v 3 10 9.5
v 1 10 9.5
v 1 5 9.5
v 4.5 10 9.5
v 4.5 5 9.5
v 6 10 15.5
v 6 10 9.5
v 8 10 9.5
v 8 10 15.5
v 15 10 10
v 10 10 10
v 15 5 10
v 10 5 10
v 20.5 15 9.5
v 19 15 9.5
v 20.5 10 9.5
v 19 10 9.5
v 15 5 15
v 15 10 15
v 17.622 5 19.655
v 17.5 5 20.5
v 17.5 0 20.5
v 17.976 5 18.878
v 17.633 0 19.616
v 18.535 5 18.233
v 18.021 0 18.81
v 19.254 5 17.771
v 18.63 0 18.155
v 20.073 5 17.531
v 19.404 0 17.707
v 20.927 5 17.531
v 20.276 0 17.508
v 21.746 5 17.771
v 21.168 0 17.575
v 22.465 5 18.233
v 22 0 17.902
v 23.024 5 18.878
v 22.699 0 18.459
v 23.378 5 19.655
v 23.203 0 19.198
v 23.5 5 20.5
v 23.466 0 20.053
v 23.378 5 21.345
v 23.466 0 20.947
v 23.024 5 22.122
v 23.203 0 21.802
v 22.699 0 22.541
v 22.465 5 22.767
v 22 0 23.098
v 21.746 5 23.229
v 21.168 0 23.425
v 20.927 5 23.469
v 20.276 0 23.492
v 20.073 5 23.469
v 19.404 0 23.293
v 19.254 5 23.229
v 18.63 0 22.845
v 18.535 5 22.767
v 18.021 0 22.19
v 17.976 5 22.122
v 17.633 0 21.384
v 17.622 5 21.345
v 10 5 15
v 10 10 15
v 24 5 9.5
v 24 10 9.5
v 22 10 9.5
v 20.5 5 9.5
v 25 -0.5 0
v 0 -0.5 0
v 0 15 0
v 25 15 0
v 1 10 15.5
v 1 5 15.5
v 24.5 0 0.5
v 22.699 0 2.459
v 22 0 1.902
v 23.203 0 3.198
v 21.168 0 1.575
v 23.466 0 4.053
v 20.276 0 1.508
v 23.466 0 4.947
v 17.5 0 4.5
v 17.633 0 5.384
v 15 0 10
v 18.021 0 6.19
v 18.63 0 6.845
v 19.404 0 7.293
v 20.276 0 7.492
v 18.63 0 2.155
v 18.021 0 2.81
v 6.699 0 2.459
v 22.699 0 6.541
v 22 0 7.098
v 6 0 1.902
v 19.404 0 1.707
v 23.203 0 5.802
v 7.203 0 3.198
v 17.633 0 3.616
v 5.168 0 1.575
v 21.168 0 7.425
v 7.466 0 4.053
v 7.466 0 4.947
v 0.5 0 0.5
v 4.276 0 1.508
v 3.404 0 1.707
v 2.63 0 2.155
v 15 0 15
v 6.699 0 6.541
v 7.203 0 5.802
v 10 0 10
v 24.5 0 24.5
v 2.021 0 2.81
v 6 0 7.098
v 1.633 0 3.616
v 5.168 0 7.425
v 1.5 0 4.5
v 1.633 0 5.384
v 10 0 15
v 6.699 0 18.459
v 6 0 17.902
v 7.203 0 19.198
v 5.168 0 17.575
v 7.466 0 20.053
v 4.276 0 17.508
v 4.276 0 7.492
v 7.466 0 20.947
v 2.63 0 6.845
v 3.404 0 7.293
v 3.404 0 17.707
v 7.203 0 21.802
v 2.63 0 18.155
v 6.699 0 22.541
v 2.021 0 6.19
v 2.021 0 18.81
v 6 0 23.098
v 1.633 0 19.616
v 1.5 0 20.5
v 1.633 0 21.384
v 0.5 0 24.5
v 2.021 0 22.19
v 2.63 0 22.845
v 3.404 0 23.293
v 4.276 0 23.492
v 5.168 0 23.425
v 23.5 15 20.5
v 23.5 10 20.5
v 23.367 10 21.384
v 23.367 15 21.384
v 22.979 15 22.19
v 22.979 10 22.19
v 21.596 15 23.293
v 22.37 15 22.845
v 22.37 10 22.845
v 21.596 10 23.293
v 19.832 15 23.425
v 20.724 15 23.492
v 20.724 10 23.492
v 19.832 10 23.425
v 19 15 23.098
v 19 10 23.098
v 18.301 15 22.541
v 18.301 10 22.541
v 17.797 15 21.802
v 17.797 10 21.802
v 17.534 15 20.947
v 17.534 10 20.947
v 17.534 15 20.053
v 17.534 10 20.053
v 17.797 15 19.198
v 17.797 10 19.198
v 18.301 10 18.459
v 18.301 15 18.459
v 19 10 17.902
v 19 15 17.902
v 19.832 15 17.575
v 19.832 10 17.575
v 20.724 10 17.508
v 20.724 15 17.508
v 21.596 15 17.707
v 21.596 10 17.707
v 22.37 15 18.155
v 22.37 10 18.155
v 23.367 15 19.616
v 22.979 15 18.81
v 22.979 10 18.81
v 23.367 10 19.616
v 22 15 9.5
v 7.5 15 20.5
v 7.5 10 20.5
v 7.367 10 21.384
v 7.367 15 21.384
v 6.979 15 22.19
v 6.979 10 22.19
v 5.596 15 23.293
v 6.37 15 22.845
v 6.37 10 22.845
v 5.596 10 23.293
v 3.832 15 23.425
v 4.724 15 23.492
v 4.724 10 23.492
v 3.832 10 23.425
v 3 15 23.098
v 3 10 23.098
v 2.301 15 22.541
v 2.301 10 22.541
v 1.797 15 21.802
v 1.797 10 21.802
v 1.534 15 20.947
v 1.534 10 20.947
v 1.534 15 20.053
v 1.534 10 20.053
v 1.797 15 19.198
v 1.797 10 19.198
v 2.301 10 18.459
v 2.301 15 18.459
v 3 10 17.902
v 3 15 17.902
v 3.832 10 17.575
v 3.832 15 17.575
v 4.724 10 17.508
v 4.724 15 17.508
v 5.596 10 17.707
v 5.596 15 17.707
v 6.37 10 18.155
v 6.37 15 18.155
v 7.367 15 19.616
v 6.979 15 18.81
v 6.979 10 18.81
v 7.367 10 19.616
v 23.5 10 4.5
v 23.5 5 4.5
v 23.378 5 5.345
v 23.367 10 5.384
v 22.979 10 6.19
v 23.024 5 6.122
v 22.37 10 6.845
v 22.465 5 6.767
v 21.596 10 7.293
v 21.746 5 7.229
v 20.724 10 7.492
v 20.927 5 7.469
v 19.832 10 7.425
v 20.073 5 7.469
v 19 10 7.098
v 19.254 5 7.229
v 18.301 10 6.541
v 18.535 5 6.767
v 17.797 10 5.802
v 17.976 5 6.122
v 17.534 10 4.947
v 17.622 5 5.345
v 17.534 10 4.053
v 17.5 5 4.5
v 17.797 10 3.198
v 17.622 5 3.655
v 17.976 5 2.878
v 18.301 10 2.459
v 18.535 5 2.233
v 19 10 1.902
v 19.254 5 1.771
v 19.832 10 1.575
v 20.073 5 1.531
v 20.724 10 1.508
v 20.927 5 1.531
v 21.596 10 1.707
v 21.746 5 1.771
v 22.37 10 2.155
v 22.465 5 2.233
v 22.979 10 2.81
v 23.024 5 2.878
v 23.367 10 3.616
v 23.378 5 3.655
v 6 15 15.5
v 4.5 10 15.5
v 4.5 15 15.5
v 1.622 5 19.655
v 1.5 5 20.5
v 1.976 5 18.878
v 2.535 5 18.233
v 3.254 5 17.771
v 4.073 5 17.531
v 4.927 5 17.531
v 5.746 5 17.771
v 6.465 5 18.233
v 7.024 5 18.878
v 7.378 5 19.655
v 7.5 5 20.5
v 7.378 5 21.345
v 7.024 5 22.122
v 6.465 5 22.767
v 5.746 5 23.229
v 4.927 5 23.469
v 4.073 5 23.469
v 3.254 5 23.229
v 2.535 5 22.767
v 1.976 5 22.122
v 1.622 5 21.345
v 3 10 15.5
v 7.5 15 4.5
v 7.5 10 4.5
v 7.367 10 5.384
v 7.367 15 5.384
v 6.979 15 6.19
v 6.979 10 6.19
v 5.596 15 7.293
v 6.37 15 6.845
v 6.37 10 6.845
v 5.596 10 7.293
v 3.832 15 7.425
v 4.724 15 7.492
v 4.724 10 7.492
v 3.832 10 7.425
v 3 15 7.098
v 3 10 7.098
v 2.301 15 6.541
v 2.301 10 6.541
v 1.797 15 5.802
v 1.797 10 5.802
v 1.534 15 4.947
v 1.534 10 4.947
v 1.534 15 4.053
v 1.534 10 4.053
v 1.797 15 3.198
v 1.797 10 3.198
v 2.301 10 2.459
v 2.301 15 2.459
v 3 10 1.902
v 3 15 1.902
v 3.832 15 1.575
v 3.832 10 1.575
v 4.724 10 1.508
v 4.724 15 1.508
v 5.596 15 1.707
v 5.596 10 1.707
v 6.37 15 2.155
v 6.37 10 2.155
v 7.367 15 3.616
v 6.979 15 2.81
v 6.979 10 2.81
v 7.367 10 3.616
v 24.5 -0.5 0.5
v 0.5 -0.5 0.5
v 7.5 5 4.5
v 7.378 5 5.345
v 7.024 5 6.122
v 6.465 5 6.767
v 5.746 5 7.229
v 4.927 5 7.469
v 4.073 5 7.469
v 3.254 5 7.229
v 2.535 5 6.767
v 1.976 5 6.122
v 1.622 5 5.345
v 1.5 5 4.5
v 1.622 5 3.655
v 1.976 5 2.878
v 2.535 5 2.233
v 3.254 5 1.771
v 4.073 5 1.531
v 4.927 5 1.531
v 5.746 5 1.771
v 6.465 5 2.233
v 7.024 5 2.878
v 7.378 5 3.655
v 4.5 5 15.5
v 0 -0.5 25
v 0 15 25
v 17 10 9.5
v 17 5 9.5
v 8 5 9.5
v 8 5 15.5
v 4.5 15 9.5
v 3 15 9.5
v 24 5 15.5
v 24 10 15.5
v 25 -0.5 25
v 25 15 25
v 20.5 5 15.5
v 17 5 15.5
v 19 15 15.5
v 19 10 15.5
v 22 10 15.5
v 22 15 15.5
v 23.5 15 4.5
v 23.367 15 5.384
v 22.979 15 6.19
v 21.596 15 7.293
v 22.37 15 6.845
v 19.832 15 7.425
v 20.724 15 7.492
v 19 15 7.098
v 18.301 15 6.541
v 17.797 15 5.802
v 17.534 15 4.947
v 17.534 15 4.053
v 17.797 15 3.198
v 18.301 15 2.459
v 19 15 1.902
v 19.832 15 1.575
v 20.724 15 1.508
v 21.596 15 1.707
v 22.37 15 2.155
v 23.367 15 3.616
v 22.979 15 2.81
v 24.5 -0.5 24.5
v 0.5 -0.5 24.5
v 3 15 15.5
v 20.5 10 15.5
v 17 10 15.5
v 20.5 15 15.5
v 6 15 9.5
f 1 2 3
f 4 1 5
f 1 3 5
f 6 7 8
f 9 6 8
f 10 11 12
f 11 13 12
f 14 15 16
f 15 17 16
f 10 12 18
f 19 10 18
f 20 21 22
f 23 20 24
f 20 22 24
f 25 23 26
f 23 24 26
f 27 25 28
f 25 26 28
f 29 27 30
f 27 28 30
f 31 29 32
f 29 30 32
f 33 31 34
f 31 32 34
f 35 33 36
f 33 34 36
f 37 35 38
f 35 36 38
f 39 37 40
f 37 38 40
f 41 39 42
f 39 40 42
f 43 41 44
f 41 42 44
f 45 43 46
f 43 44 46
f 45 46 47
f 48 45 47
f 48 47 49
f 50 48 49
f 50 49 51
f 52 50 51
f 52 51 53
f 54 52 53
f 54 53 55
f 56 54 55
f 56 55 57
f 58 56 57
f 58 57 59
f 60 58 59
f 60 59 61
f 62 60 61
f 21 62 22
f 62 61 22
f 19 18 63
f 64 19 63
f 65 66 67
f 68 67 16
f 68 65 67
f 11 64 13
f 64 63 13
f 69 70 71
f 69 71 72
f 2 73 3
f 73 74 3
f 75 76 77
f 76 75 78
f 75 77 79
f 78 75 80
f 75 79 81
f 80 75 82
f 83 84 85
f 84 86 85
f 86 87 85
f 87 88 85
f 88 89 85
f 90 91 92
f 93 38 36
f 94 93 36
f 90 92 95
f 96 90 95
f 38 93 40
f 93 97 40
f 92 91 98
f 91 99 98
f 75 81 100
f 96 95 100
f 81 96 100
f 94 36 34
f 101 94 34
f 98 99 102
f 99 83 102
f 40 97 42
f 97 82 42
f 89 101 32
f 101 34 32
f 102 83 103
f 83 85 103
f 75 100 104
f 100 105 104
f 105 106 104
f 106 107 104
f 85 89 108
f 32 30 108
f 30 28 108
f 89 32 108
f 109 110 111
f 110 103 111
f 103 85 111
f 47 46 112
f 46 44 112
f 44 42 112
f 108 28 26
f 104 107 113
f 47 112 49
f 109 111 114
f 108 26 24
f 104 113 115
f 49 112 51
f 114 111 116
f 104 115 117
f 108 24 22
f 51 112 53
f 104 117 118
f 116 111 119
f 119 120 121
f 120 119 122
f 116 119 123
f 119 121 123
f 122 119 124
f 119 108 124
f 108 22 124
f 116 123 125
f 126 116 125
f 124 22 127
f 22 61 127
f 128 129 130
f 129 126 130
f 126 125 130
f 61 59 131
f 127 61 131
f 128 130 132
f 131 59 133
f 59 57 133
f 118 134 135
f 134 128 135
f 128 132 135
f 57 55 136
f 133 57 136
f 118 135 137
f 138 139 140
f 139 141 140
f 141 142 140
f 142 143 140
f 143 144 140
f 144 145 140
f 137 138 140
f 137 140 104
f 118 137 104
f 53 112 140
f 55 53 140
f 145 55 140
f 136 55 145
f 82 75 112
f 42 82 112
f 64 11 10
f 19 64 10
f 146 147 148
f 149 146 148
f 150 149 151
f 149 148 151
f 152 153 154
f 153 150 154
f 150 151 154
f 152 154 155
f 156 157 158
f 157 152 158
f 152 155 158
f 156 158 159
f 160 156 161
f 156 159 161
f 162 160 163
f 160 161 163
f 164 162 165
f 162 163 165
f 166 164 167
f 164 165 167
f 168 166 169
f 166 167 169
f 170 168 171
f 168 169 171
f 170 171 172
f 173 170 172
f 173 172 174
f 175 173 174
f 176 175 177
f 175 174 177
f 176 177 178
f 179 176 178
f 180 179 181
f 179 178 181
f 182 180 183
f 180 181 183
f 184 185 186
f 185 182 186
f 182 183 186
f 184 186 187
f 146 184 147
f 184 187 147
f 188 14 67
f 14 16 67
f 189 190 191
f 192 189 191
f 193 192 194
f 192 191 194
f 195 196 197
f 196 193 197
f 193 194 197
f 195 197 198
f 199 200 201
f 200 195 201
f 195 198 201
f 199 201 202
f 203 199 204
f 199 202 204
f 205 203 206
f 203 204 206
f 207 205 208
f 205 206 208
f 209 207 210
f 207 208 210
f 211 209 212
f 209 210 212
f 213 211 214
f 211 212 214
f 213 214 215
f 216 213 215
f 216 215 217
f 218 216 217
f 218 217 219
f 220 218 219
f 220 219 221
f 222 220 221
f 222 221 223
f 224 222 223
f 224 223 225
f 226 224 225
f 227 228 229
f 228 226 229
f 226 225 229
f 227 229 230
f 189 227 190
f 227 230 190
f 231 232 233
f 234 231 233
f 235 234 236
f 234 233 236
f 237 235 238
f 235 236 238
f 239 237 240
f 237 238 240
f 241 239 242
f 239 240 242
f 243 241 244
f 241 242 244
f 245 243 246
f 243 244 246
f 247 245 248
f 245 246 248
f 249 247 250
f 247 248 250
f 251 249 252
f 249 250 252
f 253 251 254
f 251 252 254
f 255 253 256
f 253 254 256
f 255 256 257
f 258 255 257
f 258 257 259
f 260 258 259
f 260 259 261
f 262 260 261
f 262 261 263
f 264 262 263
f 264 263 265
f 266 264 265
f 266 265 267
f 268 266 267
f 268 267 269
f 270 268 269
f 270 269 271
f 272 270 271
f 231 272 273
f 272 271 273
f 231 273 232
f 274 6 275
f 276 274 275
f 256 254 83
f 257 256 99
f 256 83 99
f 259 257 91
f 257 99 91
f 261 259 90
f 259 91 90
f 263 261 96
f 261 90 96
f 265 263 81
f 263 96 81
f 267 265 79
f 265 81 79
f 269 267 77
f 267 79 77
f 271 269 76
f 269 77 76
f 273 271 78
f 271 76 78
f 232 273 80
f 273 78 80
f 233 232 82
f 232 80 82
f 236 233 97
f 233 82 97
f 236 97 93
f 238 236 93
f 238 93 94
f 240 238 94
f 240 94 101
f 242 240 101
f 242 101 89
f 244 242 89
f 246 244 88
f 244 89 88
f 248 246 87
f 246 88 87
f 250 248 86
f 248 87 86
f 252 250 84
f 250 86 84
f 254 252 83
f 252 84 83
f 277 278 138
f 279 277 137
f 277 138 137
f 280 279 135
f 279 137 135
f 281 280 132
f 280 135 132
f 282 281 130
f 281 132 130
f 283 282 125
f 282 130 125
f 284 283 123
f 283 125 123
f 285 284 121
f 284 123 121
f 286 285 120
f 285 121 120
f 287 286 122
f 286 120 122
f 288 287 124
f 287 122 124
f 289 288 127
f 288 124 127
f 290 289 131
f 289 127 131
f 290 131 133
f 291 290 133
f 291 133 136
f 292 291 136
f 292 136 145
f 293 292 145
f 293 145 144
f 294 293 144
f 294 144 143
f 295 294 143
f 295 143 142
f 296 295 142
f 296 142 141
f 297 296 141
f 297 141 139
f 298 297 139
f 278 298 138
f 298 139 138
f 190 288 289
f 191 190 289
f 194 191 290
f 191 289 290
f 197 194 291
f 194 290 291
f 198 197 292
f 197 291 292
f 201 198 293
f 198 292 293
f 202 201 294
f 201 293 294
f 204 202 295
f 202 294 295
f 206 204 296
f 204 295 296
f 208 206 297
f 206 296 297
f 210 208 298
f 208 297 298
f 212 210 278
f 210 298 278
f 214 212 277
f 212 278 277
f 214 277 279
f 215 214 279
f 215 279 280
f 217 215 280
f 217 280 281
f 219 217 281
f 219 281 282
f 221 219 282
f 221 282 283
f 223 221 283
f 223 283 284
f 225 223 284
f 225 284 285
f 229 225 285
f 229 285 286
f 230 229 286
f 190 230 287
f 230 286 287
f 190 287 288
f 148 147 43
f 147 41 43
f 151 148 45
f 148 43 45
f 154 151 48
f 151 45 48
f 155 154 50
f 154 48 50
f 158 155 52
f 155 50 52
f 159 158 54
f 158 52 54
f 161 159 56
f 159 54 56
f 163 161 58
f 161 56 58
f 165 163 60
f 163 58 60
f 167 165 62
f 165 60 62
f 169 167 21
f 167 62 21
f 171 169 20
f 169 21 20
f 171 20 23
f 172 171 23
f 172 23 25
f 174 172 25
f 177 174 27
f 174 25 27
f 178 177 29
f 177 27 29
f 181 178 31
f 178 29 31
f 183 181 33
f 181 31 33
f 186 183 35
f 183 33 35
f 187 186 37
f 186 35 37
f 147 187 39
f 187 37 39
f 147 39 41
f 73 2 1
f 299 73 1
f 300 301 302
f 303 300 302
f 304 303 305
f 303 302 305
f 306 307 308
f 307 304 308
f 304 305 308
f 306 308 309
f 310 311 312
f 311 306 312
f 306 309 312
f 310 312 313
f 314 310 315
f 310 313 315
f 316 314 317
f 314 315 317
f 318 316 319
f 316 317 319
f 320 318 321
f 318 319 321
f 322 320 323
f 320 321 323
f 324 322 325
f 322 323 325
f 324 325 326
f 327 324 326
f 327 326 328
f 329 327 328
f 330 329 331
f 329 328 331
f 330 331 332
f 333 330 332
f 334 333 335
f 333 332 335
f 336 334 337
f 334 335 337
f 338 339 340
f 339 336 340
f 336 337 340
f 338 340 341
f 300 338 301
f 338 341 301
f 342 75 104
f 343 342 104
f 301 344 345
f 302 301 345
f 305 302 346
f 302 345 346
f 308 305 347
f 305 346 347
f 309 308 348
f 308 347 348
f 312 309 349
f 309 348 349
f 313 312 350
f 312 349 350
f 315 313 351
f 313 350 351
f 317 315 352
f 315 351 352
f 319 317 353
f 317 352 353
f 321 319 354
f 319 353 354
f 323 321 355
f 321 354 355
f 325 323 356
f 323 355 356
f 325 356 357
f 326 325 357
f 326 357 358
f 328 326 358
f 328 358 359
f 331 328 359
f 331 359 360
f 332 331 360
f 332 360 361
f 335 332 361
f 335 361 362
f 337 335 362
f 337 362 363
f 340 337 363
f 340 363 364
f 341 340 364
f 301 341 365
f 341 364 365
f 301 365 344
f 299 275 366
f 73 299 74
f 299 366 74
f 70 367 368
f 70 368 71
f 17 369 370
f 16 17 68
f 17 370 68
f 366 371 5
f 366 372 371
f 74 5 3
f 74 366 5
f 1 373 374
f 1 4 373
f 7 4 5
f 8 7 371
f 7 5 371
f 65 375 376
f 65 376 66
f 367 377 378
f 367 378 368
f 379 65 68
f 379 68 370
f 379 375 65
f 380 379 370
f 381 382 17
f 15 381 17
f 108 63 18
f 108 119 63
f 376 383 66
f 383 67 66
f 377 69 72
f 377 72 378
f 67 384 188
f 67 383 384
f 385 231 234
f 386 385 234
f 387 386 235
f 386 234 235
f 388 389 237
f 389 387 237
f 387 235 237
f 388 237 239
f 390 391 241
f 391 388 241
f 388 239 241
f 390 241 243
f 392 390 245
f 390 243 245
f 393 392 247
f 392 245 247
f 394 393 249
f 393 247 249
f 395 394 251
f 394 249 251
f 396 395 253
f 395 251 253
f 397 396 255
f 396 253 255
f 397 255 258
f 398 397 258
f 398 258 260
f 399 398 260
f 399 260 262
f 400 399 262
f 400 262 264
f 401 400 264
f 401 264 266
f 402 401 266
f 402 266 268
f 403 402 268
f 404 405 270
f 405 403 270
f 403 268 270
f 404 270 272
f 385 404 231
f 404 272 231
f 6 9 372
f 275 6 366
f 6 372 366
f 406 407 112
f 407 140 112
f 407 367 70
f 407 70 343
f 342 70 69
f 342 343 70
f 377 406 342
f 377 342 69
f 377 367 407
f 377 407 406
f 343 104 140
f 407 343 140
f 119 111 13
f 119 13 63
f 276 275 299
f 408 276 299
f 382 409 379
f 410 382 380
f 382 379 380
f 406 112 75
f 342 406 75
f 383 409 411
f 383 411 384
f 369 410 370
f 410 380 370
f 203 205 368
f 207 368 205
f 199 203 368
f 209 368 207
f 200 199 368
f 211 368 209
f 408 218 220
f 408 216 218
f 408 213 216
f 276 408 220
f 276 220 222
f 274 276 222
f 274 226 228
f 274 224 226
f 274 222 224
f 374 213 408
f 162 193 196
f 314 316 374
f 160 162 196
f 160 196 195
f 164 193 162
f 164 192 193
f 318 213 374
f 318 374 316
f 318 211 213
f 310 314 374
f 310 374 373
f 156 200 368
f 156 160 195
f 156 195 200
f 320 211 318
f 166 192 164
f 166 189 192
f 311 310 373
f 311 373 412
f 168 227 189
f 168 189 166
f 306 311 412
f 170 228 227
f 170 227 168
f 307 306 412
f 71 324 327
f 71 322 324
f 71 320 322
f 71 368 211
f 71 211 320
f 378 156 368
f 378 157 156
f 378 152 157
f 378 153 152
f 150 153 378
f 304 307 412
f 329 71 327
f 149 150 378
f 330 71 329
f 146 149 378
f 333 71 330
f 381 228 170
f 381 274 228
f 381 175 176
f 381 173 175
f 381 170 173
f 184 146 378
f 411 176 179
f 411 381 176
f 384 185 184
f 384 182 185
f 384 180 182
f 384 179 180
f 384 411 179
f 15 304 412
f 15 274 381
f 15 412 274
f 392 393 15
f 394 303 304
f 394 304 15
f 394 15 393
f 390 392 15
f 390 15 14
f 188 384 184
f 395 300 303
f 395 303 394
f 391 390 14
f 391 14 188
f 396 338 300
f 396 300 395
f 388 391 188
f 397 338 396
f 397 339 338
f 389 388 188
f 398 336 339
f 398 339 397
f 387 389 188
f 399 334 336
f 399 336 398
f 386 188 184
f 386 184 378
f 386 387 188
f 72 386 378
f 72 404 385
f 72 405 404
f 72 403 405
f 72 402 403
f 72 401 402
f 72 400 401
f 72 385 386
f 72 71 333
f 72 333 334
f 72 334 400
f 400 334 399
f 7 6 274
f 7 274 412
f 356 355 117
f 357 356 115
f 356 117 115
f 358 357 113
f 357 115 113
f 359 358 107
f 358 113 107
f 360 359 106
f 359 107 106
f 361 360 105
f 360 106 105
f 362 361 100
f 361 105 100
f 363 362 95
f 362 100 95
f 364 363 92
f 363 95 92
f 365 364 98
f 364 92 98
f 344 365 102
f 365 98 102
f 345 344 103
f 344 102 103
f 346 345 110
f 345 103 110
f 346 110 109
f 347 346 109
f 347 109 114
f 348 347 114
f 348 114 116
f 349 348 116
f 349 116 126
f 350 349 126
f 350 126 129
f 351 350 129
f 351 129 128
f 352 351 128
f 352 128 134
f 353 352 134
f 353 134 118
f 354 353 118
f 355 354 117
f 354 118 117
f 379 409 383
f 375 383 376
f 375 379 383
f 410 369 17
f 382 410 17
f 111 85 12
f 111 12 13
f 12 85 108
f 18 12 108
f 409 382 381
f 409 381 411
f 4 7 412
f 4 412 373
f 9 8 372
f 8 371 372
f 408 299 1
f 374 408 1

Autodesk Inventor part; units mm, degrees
ref_plane "YZ Plane" through (0, 0, 0) normal (1, 0, 0) x (0, 1, 0)
ref_plane "XZ Plane" through (0, 0, 0) normal (0, 1, 0) x (-1, 0, 0)
ref_plane "XY Plane" through (0, 0, 0) normal (0, 0, 1) x (1, 0, 0)
sketch "Sketch1" plane through (0, 0, 0) normal (0, 1, 0) x (-1, 0, 0)
  line L0 (0, 0) -> (-25, 0)
  line L1 (-25, 0) -> (-25, 25)
  line L2 (-25, 25) -> (0, 25)
  line L3 (0, 25) -> (0, 0)
  line L4 (-10, 12.5) -> (-10, 15)
  line L5 (-10, 15) -> (-12.5, 15)
  line L6 (-10, 12.5) -> (-10, 10)
  line L7 (-10, 10) -> (-12.5, 10)
  line L8 (-15, 12.5) -> (-15, 15)
  line L9 (-15, 15) -> (-12.5, 15)
  line L10 (-15, 12.5) -> (-15, 10)
  line L11 (-15, 10) -> (-12.5, 10)
  circle A0 centre (-4.5, 4.5) radius 3
  circle A1 centre (-20.5, 20.5) radius 3
  circle A2 centre (-4.5, 20.5) radius 3
  circle A3 centre (-20.5, 4.5) radius 3
  dimension "d0" = 25
  dimension "d1" = 25
  dimension "d2" = 2.5
  dimension "d3" = 2.5
  dimension "d4" = 2.5
  dimension "d5" = 2.5
  dimension "d6" = 2.5
  dimension "d8" = 6
  dimension "d9" = 6
  dimension "d10" = 6
  dimension "d11" = 6
extrude "Extrusion1" add sketch "Sketch1" along normal blind 5
sketch "Sketch4" plane through (0, 0, 0) normal (0, -1, 0) x (1, 0, 0)
  line L0 (0, 0) -> (0, 25) projected
  line L1 (25, 25) -> (25, 0) projected
  line L2 (0, 25) -> (25, 25)
  line L3 (25, 25) -> (25, 0)
  line L4 (25, 0) -> (0, 0)
  line L5 (0, 0) -> (0, 25)
  line L6 (0.5, 24.5) -> (24.5, 24.5)
  line L7 (24.5, 24.5) -> (24.5, 0.5)
  line L8 (24.5, 0.5) -> (0.5, 0.5)
  line L9 (0.5, 0.5) -> (0.5, 24.5)
  dimension "d18" = 24
  dimension "d19" = 24
extrude "Extrusion3" add sketch "Sketch4" along normal blind 0.5
sketch "Sketch5" plane through (0, 5, 0) normal (0, 1, 0) x (1, 0, 0)
  line L0 (20.5, -15.5) -> (17, -15.5)
  line L1 (17, -15.5) -> (17, -9.5)
  line L2 (17, -9.5) -> (20.5, -9.5)
  line L3 (20.5, -15.5) -> (24, -15.5)
  line L4 (24, -15.5) -> (24, -9.5)
  line L5 (24, -9.5) -> (20.5, -9.5)
  line L6 (8, -15.5) -> (4.5, -15.5)
  line L7 (4.5, -9.5) -> (8, -9.5)
  line L8 (8, -9.5) -> (8, -15.5)
  line L9 (4.5, -15.5) -> (1, -15.5)
  line L10 (1, -15.5) -> (1, -9.5)
  line L11 (1, -9.5) -> (4.5, -9.5)
  circle A0 centre (20.5, -20.5) radius 3
  circle A1 centre (4.5, -20.5) radius 3
  circle A2 centre (20.5, -4.5) radius 3
  circle A3 centre (4.5, -4.5) radius 3
  line L12 (15, -15) -> (10, -15) projected
  line L13 (10, -10) -> (15, -10) projected
  line L14 (15, -15) -> (10, -15)
  line L15 (10, -15) -> (10, -10)
  line L16 (10, -10) -> (15, -10)
  line L17 (15, -10) -> (15, -15)
  line L18 (25, -25) -> (0, -25) projected
  line L19 (25, -25) -> (0, -25)
  line L20 (0, -25) -> (0, 0)
  line L21 (0, 0) -> (25, 0)
  line L22 (25, 0) -> (25, -25)
  dimension "d22" = 3.5
  dimension "d23" = 6
  dimension "d24" = 3.5
  dimension "d25" = 3.5
  dimension "d26" = 6
  dimension "d27" = 3.5
  dimension "d28" = 6
  dimension "d29" = 6
  dimension "d30" = 6
  dimension "d31" = 6
extrude "Extrusion4" add sketch "Sketch5" along normal blind 5
sketch "Sketch6" plane through (0, 10, 0) normal (0, 1, 0) x (1, 0, 0)
  line L0 (17, -15.5) -> (24, -15.5) projected
  line L1 (17, -9.5) -> (24, -9.5) projected
  line L2 (20.5, -15.5) -> (22, -15.5)
  line L3 (22, -15.5) -> (22, -9.5)
  line L4 (22, -9.5) -> (20.5, -9.5)
  line L5 (20.5, -15.5) -> (19, -15.5)
  line L6 (19, -15.5) -> (19, -9.5)
  line L7 (19, -9.5) -> (20.5, -9.5)
  line L8 (8, -15.5) -> (1, -15.5) projected
  line L9 (8, -9.5) -> (1, -9.5) projected
  line L10 (4.5, -15.5) -> (6, -15.5)
  line L11 (6, -15.5) -> (6, -9.5)
  line L12 (6, -9.5) -> (4.5, -9.5)
  line L13 (4.5, -15.5) -> (3, -15.5)
  line L14 (3, -15.5) -> (3, -9.5)
  line L15 (3, -9.5) -> (4.5, -9.5)
  line L16 (25, -25) -> (0, -25) projected
  line L17 (25, -25) -> (0, -25)
  line L18 (0, -25) -> (0, 0)
  line L19 (0, 0) -> (25, 0)
  line L20 (25, 0) -> (25, -25)
  circle A0 centre (4.5, -20.5) radius 3
  circle A1 centre (20.5, -20.5) radius 3
  circle A2 centre (20.5, -4.5) radius 3
  circle A3 centre (4.5, -4.5) radius 3
  dimension "d34" = 1.5
  dimension "d35" = 1.5
  dimension "d36" = 1.5
  dimension "d37" = 1.5
  dimension "d38" = 6
  dimension "d39" = 6
  dimension "d40" = 6
  dimension "d41" = 6
extrude "Extrusion5" add sketch "Sketch6" along normal blind 5
properties part number "SiPM cover"
